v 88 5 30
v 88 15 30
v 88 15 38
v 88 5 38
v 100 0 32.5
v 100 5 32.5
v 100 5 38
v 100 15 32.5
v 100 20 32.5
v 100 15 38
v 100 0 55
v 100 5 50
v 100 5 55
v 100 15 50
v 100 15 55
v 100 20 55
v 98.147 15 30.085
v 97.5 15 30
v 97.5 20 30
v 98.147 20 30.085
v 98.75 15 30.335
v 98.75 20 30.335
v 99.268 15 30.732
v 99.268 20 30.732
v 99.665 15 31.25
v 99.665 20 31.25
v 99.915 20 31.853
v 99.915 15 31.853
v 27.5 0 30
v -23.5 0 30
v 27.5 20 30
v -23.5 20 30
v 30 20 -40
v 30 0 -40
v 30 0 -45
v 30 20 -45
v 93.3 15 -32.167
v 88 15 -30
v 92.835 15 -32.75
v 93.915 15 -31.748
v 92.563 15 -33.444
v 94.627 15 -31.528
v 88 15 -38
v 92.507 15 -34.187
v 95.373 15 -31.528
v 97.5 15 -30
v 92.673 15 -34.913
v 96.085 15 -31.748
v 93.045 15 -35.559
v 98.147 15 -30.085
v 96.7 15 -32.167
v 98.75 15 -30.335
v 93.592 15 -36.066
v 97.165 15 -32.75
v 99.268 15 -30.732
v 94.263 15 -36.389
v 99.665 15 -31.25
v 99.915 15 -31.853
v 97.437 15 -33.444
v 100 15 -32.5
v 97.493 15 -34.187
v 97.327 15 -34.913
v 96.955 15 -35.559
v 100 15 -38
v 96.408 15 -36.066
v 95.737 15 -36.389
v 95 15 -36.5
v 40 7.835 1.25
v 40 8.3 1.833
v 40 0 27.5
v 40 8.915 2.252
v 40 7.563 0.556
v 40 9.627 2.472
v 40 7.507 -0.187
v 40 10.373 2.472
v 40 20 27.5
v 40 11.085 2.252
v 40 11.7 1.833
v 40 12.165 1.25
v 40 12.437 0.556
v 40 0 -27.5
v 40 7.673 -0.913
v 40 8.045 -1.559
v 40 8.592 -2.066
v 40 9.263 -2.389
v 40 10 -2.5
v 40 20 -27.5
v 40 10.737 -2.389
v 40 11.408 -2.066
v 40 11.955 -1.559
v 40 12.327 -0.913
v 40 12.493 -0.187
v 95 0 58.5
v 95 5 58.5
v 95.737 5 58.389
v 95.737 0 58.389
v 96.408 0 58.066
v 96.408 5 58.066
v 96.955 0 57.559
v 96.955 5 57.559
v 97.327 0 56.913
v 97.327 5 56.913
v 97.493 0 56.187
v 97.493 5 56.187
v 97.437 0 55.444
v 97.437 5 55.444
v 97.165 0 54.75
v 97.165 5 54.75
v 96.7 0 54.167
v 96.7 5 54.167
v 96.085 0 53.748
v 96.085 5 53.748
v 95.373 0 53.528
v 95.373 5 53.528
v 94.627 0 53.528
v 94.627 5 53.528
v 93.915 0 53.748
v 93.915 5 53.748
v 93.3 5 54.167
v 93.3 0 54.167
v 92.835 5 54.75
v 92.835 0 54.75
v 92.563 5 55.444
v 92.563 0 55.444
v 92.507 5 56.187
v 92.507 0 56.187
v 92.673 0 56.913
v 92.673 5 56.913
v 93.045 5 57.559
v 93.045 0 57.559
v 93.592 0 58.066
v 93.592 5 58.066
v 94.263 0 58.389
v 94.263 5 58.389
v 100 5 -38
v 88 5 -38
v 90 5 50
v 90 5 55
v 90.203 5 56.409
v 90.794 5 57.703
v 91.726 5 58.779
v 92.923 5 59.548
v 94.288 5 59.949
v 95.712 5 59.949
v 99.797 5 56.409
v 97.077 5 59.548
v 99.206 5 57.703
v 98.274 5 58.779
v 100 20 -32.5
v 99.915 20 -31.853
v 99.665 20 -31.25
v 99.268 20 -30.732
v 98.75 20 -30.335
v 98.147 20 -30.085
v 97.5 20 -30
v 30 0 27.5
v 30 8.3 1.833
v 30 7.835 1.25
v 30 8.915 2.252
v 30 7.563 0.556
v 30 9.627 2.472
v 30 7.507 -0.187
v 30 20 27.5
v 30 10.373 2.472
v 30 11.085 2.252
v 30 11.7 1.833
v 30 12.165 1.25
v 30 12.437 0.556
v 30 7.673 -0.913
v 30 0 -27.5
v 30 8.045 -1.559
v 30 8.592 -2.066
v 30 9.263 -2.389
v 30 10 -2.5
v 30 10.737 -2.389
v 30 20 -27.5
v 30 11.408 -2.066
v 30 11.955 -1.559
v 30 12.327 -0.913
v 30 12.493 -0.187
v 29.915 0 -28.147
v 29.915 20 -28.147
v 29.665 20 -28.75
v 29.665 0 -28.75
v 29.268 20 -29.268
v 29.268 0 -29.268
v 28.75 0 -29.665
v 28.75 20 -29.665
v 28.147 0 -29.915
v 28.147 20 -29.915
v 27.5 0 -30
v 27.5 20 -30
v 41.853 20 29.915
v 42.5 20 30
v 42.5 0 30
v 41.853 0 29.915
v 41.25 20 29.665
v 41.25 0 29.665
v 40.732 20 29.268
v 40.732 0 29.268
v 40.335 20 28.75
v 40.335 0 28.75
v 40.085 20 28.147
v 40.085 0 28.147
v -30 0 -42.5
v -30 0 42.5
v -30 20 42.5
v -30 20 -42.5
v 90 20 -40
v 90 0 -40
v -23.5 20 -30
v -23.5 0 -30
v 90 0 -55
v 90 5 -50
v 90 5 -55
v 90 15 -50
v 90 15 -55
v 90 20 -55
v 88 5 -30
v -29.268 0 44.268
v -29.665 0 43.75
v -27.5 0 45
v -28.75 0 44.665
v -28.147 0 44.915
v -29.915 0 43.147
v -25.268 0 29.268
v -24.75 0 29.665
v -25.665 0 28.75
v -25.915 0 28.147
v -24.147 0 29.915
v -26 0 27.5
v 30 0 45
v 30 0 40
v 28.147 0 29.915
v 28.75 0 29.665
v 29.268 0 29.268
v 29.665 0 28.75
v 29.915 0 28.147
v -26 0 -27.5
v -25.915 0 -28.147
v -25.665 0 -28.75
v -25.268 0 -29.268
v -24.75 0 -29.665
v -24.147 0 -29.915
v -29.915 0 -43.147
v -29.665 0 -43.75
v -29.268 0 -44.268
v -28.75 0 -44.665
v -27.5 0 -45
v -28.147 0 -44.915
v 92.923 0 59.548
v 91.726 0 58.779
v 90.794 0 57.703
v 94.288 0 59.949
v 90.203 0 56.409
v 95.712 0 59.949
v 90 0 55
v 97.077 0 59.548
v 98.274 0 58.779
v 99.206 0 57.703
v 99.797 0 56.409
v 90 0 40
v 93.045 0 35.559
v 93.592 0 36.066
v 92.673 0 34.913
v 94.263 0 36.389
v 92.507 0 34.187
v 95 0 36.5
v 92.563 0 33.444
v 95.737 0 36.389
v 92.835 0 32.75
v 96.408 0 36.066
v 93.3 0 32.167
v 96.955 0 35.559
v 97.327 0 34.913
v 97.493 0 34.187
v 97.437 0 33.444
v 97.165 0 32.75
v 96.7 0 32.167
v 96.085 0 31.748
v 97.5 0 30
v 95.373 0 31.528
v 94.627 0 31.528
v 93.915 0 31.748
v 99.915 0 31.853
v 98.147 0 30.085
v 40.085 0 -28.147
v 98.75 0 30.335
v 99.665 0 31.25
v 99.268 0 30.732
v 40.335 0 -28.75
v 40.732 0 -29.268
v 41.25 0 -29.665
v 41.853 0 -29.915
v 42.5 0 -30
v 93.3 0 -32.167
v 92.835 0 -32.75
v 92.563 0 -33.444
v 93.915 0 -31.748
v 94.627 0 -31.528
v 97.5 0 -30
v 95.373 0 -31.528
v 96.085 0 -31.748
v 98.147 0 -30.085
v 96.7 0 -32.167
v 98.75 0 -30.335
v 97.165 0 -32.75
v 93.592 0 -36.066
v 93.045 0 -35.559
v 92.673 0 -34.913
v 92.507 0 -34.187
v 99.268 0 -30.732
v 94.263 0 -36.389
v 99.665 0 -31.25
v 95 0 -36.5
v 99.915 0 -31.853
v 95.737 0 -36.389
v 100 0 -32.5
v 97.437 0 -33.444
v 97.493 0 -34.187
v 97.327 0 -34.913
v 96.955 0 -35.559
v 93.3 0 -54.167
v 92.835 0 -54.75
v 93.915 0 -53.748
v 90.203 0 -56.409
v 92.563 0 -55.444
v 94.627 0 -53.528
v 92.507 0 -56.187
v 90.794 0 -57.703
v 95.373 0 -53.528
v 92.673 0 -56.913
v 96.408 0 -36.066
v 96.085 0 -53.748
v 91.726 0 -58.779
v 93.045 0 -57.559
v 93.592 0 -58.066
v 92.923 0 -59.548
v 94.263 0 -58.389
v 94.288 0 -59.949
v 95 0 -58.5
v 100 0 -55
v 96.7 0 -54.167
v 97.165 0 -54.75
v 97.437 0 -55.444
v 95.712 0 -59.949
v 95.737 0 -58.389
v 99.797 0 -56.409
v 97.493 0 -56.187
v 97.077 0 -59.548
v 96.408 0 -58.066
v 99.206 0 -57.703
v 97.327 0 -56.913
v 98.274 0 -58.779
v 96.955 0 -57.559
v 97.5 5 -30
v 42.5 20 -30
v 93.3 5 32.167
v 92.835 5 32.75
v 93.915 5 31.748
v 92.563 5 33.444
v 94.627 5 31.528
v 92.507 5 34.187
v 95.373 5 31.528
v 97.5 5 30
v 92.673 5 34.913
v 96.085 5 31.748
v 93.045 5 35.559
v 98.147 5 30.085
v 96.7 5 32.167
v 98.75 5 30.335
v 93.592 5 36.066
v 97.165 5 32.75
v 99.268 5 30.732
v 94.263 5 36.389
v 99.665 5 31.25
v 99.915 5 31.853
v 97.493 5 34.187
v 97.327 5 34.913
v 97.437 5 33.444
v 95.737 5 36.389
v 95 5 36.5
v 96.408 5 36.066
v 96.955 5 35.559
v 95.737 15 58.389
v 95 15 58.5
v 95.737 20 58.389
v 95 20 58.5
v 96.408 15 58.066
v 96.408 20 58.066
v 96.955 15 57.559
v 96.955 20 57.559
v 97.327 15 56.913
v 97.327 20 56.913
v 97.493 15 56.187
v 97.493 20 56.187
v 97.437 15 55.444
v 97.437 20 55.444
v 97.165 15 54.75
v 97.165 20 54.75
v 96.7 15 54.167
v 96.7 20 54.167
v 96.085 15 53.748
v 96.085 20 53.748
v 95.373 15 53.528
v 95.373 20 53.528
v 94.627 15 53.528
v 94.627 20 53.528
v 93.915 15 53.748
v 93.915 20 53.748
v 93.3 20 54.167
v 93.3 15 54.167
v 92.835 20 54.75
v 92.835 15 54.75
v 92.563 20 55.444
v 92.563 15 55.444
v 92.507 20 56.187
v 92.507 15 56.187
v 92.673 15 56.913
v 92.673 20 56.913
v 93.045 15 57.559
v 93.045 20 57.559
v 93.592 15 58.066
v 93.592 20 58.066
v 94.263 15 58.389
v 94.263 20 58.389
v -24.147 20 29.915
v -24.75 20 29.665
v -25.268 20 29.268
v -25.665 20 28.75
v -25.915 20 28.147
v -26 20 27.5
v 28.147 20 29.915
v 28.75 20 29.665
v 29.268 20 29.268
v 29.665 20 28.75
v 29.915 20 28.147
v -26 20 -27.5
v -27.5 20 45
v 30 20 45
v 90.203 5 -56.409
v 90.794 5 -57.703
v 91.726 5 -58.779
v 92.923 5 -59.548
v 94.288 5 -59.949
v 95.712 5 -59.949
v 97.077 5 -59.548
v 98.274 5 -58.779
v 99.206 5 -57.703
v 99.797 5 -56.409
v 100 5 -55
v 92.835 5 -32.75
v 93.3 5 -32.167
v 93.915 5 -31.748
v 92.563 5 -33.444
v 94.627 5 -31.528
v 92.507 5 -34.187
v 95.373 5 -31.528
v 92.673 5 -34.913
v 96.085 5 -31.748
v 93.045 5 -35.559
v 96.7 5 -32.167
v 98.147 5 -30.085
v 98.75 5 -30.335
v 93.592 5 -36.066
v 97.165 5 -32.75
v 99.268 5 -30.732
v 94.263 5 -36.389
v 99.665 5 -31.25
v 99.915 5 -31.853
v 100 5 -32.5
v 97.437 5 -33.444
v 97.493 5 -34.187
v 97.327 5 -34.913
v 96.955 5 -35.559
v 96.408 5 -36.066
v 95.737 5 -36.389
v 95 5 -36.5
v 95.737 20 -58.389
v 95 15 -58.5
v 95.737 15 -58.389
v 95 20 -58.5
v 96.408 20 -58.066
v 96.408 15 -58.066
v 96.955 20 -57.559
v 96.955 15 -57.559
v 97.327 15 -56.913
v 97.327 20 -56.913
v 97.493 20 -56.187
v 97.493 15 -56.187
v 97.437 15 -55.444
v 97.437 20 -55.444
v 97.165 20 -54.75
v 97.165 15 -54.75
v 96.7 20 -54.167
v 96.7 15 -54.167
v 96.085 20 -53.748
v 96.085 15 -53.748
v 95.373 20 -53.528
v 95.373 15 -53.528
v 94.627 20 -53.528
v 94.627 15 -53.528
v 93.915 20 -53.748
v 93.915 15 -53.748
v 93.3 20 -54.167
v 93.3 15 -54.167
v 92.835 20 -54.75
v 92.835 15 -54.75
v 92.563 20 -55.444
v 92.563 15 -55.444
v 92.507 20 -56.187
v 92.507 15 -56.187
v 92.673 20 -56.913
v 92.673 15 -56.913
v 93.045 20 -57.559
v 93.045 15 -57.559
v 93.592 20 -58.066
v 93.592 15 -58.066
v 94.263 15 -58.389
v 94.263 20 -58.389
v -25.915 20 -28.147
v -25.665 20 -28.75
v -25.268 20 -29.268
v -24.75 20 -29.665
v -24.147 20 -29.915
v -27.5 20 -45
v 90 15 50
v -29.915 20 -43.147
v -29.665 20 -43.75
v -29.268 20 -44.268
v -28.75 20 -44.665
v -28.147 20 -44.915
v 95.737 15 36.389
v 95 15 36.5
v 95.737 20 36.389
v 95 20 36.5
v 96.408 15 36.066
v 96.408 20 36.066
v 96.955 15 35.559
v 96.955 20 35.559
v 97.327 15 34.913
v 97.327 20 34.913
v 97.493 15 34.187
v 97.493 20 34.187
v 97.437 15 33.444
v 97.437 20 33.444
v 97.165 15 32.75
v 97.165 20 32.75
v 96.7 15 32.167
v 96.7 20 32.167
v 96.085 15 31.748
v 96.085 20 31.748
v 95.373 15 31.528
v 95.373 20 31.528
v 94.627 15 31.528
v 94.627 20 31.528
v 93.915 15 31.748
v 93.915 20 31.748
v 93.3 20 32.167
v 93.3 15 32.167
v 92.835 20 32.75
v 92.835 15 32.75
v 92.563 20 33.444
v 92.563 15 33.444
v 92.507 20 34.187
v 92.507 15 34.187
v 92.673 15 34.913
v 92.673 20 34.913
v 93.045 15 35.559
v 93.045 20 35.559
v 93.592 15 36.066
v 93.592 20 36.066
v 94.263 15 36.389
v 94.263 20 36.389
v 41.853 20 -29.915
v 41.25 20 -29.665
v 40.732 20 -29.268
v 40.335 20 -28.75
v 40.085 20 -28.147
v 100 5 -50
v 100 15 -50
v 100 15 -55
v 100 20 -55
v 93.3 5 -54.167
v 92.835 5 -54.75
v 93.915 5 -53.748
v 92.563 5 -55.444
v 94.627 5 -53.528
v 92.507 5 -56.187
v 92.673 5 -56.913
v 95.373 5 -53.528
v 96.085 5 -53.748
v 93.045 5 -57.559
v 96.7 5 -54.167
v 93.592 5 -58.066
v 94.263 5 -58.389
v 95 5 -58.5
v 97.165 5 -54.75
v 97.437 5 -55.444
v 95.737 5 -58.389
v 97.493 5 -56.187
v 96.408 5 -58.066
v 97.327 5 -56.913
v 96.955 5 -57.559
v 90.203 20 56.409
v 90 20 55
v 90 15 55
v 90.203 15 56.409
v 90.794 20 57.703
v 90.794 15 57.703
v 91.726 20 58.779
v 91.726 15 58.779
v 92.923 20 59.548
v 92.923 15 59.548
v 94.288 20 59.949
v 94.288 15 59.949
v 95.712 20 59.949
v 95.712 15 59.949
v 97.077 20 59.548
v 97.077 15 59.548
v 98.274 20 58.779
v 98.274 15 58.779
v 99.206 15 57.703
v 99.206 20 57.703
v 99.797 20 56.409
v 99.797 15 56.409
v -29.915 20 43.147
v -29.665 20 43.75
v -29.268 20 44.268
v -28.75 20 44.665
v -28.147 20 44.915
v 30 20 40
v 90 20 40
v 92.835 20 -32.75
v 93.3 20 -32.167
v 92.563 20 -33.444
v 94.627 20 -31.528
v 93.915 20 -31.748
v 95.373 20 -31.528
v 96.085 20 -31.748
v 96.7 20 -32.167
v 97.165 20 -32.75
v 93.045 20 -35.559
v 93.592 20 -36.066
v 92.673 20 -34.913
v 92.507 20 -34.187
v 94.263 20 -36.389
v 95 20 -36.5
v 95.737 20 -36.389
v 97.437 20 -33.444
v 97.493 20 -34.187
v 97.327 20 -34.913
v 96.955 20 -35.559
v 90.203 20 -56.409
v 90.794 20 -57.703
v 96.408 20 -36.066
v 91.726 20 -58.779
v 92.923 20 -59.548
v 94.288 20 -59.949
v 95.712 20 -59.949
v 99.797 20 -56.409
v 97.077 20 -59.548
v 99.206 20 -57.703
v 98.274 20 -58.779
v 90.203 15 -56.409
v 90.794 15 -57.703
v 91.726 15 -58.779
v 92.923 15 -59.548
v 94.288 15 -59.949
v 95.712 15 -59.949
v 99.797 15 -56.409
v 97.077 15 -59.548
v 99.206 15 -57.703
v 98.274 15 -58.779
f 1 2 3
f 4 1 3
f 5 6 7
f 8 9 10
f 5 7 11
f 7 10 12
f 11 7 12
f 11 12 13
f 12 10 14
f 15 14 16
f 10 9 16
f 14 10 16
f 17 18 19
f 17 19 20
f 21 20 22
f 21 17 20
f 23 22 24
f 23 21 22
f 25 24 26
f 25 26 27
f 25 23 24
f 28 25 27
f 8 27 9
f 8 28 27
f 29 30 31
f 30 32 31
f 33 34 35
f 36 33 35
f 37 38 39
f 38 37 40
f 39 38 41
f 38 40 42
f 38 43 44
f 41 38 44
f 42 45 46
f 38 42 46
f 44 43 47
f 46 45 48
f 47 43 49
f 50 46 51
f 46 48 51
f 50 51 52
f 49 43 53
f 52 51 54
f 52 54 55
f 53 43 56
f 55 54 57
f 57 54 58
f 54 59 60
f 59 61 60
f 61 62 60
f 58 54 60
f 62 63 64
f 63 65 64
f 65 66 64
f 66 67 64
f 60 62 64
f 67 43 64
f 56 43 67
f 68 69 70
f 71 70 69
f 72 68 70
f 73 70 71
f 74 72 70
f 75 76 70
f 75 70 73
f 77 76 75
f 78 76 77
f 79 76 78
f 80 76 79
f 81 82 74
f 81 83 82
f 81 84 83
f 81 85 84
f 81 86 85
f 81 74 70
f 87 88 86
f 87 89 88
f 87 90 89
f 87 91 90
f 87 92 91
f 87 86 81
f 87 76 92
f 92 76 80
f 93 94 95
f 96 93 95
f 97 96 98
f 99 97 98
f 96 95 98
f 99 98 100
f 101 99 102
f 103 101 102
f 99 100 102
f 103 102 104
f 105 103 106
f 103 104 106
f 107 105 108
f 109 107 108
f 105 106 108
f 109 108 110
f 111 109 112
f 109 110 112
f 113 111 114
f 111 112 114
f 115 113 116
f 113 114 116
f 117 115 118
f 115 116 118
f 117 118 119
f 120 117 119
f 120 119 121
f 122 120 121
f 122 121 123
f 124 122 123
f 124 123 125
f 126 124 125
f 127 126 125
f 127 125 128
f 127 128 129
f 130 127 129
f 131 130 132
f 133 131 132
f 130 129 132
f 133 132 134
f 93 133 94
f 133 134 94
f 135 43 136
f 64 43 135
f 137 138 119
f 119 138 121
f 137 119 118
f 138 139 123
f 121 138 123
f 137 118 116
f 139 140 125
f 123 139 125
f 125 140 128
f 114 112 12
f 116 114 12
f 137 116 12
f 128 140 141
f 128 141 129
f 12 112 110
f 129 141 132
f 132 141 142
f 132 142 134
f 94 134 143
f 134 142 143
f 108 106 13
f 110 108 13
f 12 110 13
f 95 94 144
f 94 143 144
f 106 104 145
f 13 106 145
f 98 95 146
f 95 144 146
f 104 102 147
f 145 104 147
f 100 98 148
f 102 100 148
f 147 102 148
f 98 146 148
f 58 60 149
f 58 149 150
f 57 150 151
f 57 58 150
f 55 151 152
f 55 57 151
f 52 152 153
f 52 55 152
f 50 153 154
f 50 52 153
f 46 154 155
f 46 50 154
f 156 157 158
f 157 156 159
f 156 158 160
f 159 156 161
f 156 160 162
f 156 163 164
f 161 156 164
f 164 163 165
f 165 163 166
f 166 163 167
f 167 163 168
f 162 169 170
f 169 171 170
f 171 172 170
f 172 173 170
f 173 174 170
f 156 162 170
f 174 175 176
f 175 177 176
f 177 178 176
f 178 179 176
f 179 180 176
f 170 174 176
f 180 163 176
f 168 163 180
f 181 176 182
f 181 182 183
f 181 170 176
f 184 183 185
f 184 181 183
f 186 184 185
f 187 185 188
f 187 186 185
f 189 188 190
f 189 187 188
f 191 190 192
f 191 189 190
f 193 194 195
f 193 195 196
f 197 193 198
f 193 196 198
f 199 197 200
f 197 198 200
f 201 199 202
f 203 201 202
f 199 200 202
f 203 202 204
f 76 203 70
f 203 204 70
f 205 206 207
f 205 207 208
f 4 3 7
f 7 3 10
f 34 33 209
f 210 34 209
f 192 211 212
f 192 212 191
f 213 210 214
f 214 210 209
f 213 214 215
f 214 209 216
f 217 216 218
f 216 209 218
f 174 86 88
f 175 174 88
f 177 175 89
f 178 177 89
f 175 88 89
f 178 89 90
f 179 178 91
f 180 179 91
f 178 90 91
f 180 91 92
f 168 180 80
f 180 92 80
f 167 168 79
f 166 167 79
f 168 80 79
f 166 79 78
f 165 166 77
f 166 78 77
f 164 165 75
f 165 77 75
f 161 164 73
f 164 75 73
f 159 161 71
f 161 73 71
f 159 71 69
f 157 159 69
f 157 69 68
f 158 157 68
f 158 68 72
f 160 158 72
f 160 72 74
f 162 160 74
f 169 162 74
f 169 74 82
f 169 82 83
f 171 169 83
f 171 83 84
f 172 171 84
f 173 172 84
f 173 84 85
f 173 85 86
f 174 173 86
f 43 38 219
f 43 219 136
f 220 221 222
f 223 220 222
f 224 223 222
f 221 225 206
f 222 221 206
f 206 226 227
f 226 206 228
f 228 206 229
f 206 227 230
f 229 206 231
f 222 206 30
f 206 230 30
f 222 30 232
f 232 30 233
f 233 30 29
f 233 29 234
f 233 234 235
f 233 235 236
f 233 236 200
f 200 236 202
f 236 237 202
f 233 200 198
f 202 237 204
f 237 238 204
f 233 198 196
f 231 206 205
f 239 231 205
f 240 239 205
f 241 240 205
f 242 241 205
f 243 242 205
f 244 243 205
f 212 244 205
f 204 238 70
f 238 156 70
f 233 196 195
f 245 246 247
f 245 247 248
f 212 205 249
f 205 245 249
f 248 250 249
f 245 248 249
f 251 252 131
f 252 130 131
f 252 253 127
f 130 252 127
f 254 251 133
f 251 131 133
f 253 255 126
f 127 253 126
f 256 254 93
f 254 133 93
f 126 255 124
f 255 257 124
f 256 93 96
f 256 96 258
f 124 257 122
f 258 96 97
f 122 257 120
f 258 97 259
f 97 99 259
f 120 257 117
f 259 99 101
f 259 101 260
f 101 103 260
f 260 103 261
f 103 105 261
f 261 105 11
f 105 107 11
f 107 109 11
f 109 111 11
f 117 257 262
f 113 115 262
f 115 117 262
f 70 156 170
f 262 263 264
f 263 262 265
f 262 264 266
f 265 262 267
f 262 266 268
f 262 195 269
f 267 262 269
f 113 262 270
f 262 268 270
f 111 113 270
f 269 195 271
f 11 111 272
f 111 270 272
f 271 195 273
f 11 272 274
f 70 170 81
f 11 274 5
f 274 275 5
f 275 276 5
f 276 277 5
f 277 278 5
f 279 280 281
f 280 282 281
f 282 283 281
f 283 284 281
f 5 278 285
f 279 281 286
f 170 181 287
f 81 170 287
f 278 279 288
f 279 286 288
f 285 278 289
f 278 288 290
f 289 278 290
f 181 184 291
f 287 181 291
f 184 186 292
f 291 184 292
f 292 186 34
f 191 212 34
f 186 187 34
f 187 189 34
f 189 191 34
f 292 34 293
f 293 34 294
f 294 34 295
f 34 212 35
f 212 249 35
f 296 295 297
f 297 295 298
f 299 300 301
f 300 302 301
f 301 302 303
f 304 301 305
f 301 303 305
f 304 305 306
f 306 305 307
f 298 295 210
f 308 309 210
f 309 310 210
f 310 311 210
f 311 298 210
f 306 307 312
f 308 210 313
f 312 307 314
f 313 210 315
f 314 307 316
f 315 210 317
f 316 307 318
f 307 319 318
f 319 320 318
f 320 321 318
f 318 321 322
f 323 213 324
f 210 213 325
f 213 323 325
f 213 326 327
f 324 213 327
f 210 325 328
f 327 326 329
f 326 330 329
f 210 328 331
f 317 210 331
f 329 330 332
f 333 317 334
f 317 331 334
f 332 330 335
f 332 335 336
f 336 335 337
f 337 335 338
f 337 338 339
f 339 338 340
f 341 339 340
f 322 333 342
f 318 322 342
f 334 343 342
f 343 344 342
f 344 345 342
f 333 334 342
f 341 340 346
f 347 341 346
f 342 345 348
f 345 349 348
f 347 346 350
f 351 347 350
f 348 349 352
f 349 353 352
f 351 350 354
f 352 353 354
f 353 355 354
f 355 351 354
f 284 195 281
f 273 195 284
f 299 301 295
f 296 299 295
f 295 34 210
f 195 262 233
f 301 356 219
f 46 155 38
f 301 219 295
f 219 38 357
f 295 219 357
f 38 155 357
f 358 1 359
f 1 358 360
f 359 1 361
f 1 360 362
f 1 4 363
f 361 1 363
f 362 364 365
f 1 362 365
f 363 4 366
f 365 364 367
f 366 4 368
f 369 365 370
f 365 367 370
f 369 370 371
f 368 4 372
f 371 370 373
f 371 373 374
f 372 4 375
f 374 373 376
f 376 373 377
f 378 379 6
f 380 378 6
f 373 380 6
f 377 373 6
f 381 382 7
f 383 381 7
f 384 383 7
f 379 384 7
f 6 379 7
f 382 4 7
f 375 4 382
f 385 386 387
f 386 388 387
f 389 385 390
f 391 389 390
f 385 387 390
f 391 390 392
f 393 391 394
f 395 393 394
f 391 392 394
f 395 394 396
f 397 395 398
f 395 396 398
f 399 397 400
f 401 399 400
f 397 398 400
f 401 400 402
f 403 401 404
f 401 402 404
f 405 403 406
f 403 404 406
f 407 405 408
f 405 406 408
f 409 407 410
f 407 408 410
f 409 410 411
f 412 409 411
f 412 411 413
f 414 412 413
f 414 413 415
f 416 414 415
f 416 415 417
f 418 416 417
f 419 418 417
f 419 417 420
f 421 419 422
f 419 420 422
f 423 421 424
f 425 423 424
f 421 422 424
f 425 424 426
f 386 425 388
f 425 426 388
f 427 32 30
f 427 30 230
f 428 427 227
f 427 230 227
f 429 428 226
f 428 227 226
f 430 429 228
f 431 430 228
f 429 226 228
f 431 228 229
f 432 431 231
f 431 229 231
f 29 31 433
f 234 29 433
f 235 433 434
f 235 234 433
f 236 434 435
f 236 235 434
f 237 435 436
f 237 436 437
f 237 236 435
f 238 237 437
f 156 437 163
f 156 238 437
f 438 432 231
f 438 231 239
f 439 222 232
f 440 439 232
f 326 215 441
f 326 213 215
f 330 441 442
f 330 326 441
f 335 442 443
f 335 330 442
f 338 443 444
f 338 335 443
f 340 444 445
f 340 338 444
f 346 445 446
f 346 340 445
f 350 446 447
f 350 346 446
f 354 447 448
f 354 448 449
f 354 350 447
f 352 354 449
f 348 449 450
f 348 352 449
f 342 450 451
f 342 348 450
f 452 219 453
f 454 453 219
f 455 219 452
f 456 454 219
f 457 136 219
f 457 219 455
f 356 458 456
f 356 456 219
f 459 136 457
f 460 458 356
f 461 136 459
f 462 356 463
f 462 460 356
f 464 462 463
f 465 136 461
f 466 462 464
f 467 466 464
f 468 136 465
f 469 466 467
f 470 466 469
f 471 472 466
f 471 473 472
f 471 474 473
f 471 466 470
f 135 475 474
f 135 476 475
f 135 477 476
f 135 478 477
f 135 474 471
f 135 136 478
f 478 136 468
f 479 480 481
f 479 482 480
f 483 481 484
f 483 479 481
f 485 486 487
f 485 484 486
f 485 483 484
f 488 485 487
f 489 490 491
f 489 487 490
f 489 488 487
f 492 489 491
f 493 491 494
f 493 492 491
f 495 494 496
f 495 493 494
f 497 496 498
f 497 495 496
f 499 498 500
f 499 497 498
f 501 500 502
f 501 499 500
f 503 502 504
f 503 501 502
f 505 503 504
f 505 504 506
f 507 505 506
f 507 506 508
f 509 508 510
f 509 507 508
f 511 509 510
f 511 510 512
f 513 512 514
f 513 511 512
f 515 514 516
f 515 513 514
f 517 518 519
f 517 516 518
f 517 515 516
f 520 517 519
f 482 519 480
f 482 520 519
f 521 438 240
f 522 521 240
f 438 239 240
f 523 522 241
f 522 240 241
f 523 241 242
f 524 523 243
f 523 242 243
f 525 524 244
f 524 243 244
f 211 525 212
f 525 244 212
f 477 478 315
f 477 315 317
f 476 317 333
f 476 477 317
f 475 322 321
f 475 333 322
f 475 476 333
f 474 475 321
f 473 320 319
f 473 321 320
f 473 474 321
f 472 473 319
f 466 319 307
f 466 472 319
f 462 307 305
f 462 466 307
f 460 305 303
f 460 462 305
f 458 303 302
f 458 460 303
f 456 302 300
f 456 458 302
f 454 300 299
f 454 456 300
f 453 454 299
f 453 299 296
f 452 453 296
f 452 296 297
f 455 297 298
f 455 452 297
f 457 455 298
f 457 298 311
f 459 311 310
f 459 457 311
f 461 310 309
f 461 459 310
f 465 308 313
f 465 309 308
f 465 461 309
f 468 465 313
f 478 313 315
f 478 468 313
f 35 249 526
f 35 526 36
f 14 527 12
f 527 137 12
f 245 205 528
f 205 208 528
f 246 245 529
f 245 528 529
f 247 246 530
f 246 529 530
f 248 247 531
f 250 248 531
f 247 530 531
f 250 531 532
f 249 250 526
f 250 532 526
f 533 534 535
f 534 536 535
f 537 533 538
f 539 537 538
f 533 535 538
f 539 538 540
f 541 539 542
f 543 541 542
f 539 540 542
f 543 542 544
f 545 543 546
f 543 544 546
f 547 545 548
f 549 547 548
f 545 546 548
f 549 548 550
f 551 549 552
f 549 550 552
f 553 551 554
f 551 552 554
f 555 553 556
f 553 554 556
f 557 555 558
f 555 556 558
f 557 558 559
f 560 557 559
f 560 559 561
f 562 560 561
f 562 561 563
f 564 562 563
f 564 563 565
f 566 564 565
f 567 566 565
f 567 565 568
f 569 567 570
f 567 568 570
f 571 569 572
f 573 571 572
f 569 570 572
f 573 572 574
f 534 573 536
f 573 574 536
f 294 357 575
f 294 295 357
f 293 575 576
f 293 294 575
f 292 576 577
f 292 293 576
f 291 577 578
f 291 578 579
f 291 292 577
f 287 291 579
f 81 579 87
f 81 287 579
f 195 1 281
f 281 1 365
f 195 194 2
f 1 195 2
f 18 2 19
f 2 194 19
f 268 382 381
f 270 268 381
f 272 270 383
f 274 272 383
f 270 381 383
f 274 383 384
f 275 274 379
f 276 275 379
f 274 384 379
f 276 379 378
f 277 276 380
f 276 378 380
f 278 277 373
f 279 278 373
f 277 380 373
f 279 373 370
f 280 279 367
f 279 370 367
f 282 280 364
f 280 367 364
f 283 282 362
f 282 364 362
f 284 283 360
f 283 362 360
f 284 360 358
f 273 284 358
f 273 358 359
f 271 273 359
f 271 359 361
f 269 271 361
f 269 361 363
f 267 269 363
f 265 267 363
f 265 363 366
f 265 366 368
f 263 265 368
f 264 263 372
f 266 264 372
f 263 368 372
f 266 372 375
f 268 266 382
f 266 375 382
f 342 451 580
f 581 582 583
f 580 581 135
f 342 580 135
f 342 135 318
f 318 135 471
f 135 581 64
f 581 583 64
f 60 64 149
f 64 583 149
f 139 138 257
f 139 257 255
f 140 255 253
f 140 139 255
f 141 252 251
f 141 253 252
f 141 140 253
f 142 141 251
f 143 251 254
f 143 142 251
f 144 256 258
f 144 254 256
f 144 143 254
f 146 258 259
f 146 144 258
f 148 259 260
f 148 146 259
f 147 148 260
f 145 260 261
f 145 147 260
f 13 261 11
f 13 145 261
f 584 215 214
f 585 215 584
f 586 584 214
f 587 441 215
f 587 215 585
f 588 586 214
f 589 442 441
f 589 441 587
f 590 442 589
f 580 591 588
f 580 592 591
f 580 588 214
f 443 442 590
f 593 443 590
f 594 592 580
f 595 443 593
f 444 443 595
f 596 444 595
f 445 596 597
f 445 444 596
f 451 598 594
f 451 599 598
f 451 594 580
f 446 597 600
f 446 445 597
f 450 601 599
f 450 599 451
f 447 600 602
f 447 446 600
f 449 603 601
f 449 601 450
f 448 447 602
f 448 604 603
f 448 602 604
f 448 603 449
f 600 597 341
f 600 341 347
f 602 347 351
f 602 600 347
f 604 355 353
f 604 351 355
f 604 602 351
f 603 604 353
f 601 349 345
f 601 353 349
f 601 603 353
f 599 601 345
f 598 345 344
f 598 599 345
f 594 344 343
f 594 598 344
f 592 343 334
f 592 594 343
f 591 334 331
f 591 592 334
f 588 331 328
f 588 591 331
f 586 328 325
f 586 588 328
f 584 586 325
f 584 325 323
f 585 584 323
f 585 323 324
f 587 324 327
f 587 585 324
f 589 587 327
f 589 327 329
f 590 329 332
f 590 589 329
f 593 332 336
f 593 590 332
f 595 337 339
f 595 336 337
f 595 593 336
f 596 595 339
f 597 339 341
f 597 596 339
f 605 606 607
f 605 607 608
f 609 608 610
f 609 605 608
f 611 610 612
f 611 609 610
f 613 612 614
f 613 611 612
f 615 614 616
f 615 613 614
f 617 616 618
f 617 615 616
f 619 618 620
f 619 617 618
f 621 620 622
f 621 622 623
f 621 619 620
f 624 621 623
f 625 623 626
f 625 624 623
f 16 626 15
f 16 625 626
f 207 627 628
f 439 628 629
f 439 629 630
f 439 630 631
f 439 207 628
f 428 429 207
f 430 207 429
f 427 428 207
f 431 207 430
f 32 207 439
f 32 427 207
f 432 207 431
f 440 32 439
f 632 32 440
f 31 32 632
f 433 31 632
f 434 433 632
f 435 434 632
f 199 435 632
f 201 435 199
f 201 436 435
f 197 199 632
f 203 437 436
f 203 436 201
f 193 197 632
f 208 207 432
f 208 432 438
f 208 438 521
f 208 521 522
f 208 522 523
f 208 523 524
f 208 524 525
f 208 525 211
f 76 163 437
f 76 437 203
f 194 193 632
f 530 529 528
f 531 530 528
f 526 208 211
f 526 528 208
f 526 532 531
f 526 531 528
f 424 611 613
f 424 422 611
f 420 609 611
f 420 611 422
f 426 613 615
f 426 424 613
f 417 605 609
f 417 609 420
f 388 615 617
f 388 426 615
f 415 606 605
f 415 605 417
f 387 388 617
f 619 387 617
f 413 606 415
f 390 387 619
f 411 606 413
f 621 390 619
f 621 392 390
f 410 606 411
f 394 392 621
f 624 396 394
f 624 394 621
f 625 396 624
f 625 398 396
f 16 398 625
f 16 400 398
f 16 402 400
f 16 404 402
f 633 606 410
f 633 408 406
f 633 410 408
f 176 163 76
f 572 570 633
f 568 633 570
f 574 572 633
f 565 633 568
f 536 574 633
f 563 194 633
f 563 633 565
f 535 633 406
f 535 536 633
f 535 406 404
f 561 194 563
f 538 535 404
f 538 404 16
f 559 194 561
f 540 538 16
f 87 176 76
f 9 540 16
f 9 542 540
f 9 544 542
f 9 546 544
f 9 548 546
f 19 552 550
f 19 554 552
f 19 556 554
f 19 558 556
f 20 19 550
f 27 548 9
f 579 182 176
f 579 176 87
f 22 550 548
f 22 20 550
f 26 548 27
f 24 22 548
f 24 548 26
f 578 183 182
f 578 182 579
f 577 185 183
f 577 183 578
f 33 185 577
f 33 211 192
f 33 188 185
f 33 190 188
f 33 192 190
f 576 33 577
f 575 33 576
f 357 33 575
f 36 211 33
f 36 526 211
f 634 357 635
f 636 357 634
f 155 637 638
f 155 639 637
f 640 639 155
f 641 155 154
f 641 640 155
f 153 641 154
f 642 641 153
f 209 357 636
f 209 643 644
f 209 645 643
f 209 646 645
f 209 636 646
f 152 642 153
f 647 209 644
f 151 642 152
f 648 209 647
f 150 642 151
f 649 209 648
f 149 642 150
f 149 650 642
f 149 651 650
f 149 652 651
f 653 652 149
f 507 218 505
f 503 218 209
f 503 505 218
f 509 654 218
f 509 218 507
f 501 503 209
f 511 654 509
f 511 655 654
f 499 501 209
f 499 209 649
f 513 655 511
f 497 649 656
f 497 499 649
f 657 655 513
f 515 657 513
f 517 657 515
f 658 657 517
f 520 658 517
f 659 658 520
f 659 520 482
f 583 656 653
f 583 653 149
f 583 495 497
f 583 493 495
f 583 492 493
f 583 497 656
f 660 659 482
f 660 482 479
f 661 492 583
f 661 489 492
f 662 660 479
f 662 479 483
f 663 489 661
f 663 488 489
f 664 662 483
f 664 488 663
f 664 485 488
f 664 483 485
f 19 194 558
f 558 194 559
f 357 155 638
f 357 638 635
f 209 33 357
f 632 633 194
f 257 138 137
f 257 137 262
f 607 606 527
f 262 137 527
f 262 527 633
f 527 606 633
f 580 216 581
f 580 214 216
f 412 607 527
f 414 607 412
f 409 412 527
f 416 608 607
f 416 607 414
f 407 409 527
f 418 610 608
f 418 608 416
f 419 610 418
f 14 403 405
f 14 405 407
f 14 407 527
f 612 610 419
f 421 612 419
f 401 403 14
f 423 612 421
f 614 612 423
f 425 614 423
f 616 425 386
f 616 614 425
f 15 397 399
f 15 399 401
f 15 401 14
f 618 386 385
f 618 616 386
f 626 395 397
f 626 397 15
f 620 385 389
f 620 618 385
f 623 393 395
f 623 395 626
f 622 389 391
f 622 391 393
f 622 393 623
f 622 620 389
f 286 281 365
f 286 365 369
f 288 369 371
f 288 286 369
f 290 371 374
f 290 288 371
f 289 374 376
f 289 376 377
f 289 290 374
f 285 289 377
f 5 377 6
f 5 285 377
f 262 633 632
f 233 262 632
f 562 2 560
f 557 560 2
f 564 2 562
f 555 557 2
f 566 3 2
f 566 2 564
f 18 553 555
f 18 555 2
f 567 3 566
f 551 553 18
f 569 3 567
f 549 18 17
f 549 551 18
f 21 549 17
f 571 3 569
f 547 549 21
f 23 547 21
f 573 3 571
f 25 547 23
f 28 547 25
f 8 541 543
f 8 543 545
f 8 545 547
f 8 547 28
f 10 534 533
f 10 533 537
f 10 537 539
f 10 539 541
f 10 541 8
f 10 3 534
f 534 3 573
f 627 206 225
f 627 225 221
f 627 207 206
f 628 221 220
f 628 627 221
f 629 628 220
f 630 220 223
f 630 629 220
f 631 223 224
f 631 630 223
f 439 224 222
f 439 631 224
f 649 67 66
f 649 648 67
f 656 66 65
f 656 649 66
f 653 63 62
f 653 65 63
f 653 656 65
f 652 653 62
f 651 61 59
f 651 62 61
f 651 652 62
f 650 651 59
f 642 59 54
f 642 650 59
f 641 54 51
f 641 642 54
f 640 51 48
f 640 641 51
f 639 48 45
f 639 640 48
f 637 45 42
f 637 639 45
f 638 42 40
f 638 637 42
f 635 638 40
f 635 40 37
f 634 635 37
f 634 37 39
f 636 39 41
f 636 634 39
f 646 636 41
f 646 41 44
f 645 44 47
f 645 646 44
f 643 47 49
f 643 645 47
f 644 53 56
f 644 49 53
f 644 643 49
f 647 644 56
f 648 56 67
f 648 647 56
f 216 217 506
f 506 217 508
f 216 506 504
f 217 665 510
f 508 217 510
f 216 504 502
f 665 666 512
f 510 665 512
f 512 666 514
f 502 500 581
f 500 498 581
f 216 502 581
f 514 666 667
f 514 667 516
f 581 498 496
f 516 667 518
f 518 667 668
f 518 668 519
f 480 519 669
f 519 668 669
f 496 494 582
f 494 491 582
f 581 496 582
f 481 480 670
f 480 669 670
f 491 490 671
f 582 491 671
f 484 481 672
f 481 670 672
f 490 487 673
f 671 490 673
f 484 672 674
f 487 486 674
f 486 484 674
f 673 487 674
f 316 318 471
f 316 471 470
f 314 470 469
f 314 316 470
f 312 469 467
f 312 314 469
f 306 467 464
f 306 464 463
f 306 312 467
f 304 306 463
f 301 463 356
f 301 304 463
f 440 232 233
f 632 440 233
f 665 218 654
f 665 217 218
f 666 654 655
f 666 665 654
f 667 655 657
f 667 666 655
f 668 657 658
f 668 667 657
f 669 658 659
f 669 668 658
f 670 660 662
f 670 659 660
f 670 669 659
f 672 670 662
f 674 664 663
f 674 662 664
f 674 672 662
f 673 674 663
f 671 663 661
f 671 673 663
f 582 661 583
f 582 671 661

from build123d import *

# Parameters (mm, degrees)
SKETCH1_W           = 60
SKETCH1_H           = 90
BOSS_EXTRUDE1_DEPTH = 20
EXTRUDE_THIN2_DEPTH = 20
SKETCH4_W           = 52
SKETCH4_H           = 60
CUT_EXTRUDE1_DEPTH  = 20
SKETCH5_W           = 4
SKETCH5_H           = 60
CUT_EXTRUDE2_DEPTH  = 20
SKETCH6_R           = 2.5
CUT_EXTRUDE5_DEPTH  = 20
SKETCH8_R           = 2.5
CUT_EXTRUDE6_DEPTH  = 20
FILLET1_R           = 2.5
SKETCH10_R          = 2.5
CUT_EXTRUDE8_DEPTH  = 20
FILLET4_RADIUS      = 5
FILLET4_LENGTH      = 20
FILLET5_RADIUS      = 5
FILLET5_LENGTH      = 20
FILLET7_R           = 2.5
SKETCH14_W          = 10
SKETCH14_H          = 10
SKETCH14_W_2        = 12
SKETCH14_H_2        = 8
CUT_EXTRUDE12_DEPTH = 5


with BuildPart() as part:
    # Sketch1 → Boss-Extrude1 (new body)
    with BuildSketch(Plane(origin=(0, 0, 0), x_dir=(1, 0, 0), z_dir=(0, 1, 0))):
        Rectangle(SKETCH1_W, SKETCH1_H)
    extrude(amount=BOSS_EXTRUDE1_DEPTH)

    # Sketch2 → Extrude-Thin2 (add)
    with BuildSketch(Plane(origin=(0, 20, 0), x_dir=(1, 0, 0), z_dir=(0, 1, 0))):
        Polygon((90, -60), (90, -40), (30, -40), (30, 0), (30, 40), (90, 40), (90, 60), (100, 60), (100, 30), (40, 30), (40, 0), (40, -30), (100, -30), (100, -60), align=None)
    extrude(amount=-EXTRUDE_THIN2_DEPTH)

    # Sketch4 → Cut-Extrude1 (cut)
    with BuildSketch(Plane(origin=(0, 20, 0), x_dir=(1, 0, 0), z_dir=(0, 1, 0))):
        Rectangle(SKETCH4_W, SKETCH4_H)
    extrude(amount=-CUT_EXTRUDE1_DEPTH, mode=Mode.SUBTRACT)

    # Sketch5 → Cut-Extrude2 (cut)
    with BuildSketch(Plane(origin=(0, 20, 0), x_dir=(1, 0, 0), z_dir=(0, 1, 0))):
        with Locations((28, 0)):
            Rectangle(SKETCH5_W, SKETCH5_H)
    extrude(amount=-CUT_EXTRUDE2_DEPTH, mode=Mode.SUBTRACT)

    # Sketch6 → Cut-Extrude5 (cut, symmetric)
    with BuildSketch(Plane(origin=(0, 10, 0), x_dir=(1, 0, 0), z_dir=(0, 1, 0))):
        with Locations(Location((95, -34, 0), (0, 0, 270))):
            Circle(SKETCH6_R)
    cut_extrude5 = extrude(amount=CUT_EXTRUDE5_DEPTH, both=True, mode=Mode.SUBTRACT)

    # Sketch8 → Cut-Extrude6 (cut, symmetric)
    with BuildSketch(Plane(origin=(0, 10, 0), x_dir=(1, 0, 0), z_dir=(0, 1, 0))):
        with Locations(Location((95, -56, 0), (0, 0, 270))):
            Circle(SKETCH8_R)
    cut_extrude6 = extrude(amount=CUT_EXTRUDE6_DEPTH, both=True, mode=Mode.SUBTRACT)

    # Mirror1: Cut-Extrude5, Cut-Extrude6 across plane
    add(cut_extrude5.mirror(Plane.XY), mode=Mode.SUBTRACT)
    add(cut_extrude6.mirror(Plane.XY), mode=Mode.SUBTRACT)

    # Fillet1
    fillet1_edges = [part.edges().sort_by_distance(p)[0] for p in [
        (40, 10, -30),
        (40, 10, 30),
        (-26, 10, 30),
        (-26, 10, -30),
        (30, 10, -30),
        (30, 10, 30),
        (-30, 10, -45),
        (-30, 10, 45),
    ]]
    fillet(fillet1_edges, radius=FILLET1_R)

    # Sketch10 → Cut-Extrude8 (cut)
    with BuildSketch(Plane(origin=(40, 0, 0), x_dir=(0, 0, -1), z_dir=(1, 0, 0))):
        with Locations((0, 10)):
            Circle(SKETCH10_R)
    extrude(amount=-CUT_EXTRUDE8_DEPTH, mode=Mode.SUBTRACT)

    # Fillet4: full round fillet: the end face becomes a half cylinder, R = half its width
    fillet4_face = Plane((95, 10, 60), x_dir=(0, 1, 0), z_dir=(0, 0, 1))  # on the end face: x along it, z out of the body
    fillet4_slab = fillet4_face.offset(-FILLET4_RADIUS / 2) * Box(FILLET4_LENGTH, 2 * FILLET4_RADIUS, FILLET4_RADIUS, mode=Mode.PRIVATE)  # the body's end, R deep
    fillet4_round = Plane((95, 10, 55), x_dir=(0, 0, 1), z_dir=(0, 1, 0)) * Cylinder(FILLET4_RADIUS, FILLET4_LENGTH, mode=Mode.PRIVATE)  # its axis R under the face
    add(fillet4_slab - fillet4_round, mode=Mode.SUBTRACT)

    # Fillet5: full round fillet: the end face becomes a half cylinder, R = half its width
    fillet5_face = Plane((95, 10, -60), x_dir=(0, -1, 0), z_dir=(0, 0, -1))  # on the end face: x along it, z out of the body
    fillet5_slab = fillet5_face.offset(-FILLET5_RADIUS / 2) * Box(FILLET5_LENGTH, 2 * FILLET5_RADIUS, FILLET5_RADIUS, mode=Mode.PRIVATE)  # the body's end, R deep
    fillet5_round = Plane((95, 10, -55), x_dir=(0, 0, -1), z_dir=(0, -1, 0)) * Cylinder(FILLET5_RADIUS, FILLET5_LENGTH, mode=Mode.PRIVATE)  # its axis R under the face
    add(fillet5_slab - fillet5_round, mode=Mode.SUBTRACT)

    # Fillet7
    fillet7_edges = [part.edges().sort_by_distance(p)[0] for p in [
        (100, 10, -30),
        (100, 10, 30),
    ]]
    fillet(fillet7_edges, radius=FILLET7_R)

    # Sketch14 → Cut-Extrude12 (cut, symmetric)
    with BuildSketch(Plane(origin=(0, 10, 0), x_dir=(1, 0, 0), z_dir=(0, 1, 0))):
        with Locations((95, 55)):
            Rectangle(SKETCH14_W, SKETCH14_H)
        with Locations((94, 34)):
            Rectangle(SKETCH14_W_2, SKETCH14_H_2)
    cut_extrude12 = extrude(amount=CUT_EXTRUDE12_DEPTH, both=True, mode=Mode.SUBTRACT)

    # Mirror3: Cut-Extrude12 across plane
    add(cut_extrude12.mirror(Plane.XY), mode=Mode.SUBTRACT)


solid = part.part
